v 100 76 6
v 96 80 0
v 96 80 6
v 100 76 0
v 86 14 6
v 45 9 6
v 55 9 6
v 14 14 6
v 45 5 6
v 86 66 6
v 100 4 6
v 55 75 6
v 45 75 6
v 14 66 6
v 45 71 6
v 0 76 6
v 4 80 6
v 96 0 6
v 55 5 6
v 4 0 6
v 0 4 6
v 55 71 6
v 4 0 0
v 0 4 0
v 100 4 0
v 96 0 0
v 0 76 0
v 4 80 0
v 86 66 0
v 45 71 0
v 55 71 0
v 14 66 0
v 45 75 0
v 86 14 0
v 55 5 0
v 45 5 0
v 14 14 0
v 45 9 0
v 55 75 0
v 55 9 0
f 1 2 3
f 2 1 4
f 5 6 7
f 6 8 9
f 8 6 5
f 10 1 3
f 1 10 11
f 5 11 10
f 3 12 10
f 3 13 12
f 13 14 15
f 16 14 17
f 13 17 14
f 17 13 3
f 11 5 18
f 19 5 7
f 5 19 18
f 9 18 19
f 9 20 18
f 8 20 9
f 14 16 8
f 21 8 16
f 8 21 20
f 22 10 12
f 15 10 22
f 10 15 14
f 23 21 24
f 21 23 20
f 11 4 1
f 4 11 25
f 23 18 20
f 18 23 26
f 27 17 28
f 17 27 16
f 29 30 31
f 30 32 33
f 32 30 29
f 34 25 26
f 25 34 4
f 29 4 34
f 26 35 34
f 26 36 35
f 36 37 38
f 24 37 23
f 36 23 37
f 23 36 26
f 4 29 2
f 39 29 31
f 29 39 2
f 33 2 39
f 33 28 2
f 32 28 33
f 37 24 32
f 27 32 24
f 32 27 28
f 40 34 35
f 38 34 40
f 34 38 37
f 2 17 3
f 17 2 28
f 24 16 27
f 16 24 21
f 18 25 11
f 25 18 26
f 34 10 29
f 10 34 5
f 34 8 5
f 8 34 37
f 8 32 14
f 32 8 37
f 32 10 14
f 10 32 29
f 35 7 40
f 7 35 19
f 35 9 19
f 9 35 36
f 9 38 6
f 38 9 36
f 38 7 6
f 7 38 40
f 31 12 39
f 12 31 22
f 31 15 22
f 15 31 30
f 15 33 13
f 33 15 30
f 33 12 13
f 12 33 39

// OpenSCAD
$fn = 32;

// ----------------------------------------------------------------------
// Frame plate: 100 x 80 frame, 14 mm rails
// ----------------------------------------------------------------------

// --- parameters (mm) ---
plate_l = 100;            // plate length, X
plate_w = 80;             // plate width, Y
plate_t = 6;              // plate thickness, Z (extrusion height)
corner_c = 4;             // corner chamfer
frame_bar = 14;           // frame rail width
slot_l = 10;              // adjustment slot length
slot_w = 4;               // adjustment slot width

win_l = plate_l - 2 * frame_bar;  // window length
win_w = plate_w - 2 * frame_bar;  // window width

profile = [[4, 0], [96, 0], [100, 4], [100, 76], [96, 80], [4, 80], [0, 76], [0, 4]];  // primary outline, 8 points, counter clockwise
void_1 = [[14, 14], [86, 14], [86, 66], [14, 66]];  // the window, 4 points
void_2 = [[45, 5], [55, 5], [55, 9], [45, 9]];  // adjustment slot, 4 points
void_3 = [[45, 71], [55, 71], [55, 75], [45, 75]];  // adjustment slot, 4 points

// --- the one profile operation ---
difference() {
  linear_extrude(height = plate_t) polygon(points = profile);
  translate([0, 0, -1])
    linear_extrude(height = plate_t + 2) polygon(points = void_1);
  translate([0, 0, -1])
    linear_extrude(height = plate_t + 2) polygon(points = void_2);
  translate([0, 0, -1])
    linear_extrude(height = plate_t + 2) polygon(points = void_3);
}
